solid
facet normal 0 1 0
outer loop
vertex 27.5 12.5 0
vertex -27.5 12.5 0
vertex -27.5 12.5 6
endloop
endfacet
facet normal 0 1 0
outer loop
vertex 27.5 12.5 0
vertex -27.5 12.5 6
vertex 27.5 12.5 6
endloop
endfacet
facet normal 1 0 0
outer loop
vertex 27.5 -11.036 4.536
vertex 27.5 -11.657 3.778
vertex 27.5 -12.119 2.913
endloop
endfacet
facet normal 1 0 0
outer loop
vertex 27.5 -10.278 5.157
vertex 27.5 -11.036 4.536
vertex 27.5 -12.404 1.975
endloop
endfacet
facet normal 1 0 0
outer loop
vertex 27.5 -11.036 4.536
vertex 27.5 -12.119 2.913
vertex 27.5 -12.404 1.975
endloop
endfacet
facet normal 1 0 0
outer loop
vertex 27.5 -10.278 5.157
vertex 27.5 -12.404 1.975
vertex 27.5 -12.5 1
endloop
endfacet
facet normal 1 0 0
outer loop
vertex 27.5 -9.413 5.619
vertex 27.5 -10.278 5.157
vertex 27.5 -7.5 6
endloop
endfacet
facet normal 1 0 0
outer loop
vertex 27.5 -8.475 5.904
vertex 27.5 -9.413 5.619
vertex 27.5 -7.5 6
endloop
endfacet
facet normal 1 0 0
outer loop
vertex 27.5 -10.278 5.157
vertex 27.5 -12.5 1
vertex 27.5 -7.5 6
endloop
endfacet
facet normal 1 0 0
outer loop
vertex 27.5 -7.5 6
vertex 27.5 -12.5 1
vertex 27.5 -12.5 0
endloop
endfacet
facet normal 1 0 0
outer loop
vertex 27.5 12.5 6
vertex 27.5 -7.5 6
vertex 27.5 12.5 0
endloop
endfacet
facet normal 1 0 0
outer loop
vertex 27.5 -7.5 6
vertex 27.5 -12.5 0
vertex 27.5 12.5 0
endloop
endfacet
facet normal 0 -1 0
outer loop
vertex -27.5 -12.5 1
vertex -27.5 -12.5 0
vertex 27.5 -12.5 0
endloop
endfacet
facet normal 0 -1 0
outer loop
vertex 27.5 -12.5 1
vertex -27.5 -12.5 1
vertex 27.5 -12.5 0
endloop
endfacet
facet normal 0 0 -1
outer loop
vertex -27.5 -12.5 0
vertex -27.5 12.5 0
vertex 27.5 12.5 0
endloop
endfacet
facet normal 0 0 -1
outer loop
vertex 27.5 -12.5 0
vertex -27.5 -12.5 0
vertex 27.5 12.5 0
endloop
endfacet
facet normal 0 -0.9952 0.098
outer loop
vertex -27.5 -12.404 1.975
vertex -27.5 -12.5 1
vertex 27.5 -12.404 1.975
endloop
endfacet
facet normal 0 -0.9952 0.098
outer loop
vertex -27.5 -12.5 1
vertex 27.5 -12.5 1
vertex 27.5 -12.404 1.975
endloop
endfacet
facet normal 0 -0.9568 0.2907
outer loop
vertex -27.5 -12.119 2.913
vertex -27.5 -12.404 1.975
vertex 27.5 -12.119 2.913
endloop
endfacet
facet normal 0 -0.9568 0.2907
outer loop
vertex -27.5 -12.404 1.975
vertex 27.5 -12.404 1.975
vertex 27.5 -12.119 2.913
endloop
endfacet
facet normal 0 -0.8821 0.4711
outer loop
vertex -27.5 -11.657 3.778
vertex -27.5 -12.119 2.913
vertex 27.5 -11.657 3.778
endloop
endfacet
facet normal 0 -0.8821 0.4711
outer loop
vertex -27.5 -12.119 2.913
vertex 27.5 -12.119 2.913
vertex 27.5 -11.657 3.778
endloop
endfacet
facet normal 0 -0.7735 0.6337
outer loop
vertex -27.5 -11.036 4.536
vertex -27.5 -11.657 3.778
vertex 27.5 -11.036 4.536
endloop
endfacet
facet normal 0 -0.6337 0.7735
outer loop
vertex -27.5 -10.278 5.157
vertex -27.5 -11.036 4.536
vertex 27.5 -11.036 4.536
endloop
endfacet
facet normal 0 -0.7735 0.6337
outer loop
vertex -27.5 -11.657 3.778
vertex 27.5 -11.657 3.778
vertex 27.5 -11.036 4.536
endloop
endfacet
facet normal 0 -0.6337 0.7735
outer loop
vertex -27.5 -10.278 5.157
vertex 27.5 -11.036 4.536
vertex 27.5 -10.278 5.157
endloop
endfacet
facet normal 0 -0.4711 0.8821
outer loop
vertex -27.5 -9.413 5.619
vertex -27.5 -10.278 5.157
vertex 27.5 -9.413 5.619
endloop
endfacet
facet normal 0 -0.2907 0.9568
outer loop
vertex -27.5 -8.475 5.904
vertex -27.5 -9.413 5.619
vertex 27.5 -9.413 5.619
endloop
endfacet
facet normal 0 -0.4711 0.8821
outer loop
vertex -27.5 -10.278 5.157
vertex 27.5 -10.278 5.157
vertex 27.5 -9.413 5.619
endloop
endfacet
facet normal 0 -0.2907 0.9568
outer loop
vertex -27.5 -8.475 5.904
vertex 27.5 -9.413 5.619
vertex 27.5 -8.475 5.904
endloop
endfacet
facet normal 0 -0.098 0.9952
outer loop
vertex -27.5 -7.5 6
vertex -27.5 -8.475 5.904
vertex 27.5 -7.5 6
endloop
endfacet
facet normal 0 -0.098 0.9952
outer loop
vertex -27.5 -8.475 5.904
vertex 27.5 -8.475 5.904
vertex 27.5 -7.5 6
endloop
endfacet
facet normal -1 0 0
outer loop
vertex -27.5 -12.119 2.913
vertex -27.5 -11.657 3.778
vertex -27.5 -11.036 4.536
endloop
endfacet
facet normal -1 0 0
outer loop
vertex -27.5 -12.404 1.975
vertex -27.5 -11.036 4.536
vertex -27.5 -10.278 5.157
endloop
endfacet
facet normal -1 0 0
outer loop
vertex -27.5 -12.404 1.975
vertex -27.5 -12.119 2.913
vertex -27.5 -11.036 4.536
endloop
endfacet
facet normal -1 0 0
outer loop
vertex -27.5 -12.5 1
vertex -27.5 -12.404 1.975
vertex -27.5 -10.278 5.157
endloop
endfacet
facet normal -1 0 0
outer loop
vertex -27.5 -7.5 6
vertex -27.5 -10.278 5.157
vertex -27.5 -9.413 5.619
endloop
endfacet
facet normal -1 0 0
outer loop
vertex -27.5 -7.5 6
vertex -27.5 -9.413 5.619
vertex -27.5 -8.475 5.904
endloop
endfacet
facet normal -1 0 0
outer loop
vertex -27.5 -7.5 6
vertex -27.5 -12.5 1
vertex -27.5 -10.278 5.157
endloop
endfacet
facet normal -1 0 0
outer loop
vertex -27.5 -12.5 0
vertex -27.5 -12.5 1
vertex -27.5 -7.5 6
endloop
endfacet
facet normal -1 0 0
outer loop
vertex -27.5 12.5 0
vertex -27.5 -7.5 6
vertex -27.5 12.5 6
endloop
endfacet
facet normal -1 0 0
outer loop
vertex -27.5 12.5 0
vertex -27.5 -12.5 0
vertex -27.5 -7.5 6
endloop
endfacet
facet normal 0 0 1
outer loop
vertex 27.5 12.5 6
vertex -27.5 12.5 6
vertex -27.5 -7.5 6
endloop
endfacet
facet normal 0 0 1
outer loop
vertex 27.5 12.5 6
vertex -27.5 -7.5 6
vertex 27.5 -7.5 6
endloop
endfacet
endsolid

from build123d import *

# Parameters (mm, degrees)
SKETCH1_W           = 55
SKETCH1_H           = 25
BOSS_EXTRUDE1_DEPTH = 6
FILLET1_R           = 5


with BuildPart() as part:
    # Sketch1 → Boss-Extrude1 (new body)
    with BuildSketch(Plane.XY):
        Rectangle(SKETCH1_W, SKETCH1_H)
    extrude(amount=BOSS_EXTRUDE1_DEPTH)

    # Fillet1
    fillet1_edges = [part.edges().sort_by_distance(p)[0] for p in [
        (0, -12.5, 6),
    ]]
    fillet(fillet1_edges, radius=FILLET1_R)


solid = part.part
